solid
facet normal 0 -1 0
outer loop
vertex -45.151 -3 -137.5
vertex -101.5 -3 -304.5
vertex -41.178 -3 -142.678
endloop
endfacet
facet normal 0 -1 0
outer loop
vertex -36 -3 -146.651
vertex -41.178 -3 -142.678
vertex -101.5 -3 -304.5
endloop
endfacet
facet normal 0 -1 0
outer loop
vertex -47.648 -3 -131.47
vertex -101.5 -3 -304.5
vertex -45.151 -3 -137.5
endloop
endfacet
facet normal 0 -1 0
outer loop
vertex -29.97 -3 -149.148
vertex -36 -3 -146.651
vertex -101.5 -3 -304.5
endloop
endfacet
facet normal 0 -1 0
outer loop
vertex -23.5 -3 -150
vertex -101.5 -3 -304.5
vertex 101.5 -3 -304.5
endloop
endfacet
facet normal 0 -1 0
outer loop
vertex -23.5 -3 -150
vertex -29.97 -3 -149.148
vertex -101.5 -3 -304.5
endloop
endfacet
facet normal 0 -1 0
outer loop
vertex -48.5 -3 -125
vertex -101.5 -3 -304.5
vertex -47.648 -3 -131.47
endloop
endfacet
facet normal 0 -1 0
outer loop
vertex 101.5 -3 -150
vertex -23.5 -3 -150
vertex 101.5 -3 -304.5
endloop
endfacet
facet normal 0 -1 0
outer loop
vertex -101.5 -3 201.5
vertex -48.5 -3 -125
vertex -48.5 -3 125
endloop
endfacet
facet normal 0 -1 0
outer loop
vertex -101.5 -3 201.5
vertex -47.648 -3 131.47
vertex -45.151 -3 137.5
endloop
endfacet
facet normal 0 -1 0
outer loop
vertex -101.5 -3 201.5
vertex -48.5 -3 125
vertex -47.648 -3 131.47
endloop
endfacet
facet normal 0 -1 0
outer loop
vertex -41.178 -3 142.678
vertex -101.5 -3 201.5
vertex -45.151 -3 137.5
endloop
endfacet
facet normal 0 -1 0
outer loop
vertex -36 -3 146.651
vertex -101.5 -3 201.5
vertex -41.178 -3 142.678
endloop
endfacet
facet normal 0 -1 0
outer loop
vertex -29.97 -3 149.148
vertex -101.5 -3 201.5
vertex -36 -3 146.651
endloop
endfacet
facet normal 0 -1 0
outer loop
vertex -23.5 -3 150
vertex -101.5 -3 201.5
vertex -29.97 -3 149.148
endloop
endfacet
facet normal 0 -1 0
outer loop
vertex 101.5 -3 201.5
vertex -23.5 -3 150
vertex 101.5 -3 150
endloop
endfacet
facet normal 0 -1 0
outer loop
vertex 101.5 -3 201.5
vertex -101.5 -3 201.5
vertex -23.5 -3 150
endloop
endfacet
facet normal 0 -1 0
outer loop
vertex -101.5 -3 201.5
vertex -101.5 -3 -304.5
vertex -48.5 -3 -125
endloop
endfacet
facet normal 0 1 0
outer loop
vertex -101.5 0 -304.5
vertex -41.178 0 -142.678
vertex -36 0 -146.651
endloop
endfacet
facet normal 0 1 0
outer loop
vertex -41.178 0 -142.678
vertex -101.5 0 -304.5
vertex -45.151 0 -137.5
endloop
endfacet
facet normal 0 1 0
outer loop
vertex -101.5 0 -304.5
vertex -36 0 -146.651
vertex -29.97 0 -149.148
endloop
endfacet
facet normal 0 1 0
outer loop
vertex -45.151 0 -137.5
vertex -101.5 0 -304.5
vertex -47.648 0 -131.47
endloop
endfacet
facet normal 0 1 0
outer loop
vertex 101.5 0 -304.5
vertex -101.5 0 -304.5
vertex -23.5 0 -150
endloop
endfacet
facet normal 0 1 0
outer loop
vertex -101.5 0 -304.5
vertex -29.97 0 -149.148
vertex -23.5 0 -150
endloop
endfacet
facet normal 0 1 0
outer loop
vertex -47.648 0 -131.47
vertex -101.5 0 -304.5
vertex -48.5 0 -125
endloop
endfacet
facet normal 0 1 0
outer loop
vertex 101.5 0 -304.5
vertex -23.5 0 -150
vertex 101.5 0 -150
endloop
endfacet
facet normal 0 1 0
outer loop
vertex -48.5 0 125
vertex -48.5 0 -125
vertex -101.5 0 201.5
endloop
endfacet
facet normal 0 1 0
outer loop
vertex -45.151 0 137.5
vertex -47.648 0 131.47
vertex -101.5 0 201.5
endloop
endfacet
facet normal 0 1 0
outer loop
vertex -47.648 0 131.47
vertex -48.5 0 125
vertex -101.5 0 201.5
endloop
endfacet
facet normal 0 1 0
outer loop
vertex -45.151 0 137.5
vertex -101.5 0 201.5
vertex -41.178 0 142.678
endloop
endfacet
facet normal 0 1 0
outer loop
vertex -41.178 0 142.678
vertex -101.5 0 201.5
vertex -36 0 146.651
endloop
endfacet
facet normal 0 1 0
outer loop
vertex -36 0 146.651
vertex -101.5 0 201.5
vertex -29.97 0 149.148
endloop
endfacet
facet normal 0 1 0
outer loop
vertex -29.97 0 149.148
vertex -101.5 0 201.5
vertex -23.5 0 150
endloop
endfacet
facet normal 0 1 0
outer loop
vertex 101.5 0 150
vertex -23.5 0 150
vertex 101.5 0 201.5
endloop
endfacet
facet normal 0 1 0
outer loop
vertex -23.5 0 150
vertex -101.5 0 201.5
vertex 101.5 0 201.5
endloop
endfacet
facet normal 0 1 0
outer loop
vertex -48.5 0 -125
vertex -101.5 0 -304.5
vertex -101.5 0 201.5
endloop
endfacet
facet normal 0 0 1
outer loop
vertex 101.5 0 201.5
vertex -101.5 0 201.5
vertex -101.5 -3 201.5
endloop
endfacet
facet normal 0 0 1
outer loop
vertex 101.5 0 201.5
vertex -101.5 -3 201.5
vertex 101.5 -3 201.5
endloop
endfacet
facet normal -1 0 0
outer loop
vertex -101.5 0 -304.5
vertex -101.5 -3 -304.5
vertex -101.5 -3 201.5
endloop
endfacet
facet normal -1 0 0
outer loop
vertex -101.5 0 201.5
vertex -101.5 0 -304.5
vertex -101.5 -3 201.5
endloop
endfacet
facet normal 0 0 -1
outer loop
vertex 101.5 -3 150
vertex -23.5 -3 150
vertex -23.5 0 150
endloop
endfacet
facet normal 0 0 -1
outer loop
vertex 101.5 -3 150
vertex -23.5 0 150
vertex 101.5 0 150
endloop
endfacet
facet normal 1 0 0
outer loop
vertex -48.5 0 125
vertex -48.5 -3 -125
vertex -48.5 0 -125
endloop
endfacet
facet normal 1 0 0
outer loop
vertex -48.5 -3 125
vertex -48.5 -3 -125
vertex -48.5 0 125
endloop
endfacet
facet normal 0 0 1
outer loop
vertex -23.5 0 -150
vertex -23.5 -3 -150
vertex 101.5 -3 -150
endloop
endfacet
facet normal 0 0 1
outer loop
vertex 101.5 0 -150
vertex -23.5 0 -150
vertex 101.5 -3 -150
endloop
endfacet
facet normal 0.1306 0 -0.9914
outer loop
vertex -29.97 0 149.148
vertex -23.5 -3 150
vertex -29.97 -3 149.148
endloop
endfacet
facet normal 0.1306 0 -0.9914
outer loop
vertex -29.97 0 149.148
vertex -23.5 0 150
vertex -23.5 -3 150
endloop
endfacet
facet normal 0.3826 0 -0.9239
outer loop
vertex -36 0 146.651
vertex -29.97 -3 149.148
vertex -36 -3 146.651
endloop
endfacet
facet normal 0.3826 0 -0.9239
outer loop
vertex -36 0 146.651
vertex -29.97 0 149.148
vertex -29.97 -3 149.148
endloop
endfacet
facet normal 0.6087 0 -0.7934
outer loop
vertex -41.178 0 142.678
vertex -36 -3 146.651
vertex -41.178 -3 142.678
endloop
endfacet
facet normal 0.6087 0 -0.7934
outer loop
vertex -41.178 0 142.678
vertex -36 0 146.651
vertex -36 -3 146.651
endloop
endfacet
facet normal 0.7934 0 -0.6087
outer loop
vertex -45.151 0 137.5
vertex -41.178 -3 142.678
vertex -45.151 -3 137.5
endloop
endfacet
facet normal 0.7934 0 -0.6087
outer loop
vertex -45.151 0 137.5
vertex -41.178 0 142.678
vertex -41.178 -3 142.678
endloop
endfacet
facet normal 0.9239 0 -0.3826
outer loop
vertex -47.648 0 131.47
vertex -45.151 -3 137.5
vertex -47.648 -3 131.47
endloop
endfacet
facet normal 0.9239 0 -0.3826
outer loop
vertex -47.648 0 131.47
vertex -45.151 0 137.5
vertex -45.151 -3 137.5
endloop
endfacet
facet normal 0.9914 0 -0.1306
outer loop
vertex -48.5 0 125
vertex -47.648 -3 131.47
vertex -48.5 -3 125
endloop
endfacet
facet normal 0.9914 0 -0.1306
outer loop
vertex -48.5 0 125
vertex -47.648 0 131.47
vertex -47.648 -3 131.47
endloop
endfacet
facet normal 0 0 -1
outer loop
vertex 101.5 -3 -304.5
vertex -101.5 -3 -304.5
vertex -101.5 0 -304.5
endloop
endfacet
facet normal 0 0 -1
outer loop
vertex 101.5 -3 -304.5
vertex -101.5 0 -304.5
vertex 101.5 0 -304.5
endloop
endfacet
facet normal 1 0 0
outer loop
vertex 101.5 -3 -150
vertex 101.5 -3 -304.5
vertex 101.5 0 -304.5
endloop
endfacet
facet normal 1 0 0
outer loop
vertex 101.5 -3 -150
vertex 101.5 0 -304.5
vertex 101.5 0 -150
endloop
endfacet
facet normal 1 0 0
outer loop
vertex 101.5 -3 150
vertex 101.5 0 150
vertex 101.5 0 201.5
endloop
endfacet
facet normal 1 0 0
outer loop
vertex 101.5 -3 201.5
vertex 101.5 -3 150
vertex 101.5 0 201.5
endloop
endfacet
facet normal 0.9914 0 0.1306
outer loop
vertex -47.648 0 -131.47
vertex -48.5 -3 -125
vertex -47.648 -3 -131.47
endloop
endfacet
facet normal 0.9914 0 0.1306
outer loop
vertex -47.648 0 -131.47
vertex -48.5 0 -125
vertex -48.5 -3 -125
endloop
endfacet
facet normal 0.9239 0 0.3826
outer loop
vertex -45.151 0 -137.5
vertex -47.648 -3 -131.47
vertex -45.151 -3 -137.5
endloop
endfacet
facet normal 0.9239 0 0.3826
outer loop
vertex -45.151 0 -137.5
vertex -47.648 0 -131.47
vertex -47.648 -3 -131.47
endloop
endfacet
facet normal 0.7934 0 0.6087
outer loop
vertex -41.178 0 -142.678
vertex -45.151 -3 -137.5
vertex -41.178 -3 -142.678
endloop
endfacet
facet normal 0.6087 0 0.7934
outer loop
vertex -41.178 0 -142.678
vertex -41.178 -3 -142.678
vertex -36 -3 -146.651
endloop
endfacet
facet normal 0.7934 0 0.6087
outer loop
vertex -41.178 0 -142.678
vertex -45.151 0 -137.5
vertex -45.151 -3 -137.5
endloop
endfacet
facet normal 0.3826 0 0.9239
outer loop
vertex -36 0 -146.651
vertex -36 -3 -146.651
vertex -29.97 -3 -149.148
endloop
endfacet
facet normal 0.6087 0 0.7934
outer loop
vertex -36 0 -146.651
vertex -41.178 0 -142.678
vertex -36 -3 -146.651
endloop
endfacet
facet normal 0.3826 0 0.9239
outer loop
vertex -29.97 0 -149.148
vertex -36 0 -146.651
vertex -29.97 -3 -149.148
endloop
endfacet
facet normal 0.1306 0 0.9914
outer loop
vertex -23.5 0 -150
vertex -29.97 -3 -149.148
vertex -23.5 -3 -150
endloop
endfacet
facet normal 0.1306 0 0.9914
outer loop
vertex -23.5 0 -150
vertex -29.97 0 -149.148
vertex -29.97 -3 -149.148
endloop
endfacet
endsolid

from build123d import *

# Parameters (mm, degrees)
F0_W     = 203
F0_H     = 403
F1_DEPTH = 3
F2_W     = 150
F2_H     = 300
F3_DEPTH = 25
F4_R     = 25
F5_W     = 203
F5_H     = 103
F6_DEPTH = 3


with BuildPart() as f1:
    # F0 (on Front) → F1 (new body)
    with BuildSketch(Plane.XZ):
        Rectangle(F0_W, F0_H)
    extrude(amount=F1_DEPTH)

    # F2 (on face) → F3 (cut)
    with BuildSketch(Plane.XZ.offset(3)):
        with Locations((26.5, 0)):
            Rectangle(F2_W, F2_H)
    extrude(amount=-F3_DEPTH, mode=Mode.SUBTRACT)

    # F4
    f4_edges = [f1.edges().sort_by_distance(p)[0] for p in [
        (-48.5, -1.5, 150),
        (-48.5, -1.5, -150),
    ]]
    fillet(f4_edges, radius=F4_R)

    # F5 (on face) → F6 (join, through all)
    with BuildSketch(Plane.XZ.offset(3)):
        with Locations((0, -253)):
            Rectangle(F5_W, F5_H)
    extrude(amount=-F6_DEPTH)


solid = f1.part
